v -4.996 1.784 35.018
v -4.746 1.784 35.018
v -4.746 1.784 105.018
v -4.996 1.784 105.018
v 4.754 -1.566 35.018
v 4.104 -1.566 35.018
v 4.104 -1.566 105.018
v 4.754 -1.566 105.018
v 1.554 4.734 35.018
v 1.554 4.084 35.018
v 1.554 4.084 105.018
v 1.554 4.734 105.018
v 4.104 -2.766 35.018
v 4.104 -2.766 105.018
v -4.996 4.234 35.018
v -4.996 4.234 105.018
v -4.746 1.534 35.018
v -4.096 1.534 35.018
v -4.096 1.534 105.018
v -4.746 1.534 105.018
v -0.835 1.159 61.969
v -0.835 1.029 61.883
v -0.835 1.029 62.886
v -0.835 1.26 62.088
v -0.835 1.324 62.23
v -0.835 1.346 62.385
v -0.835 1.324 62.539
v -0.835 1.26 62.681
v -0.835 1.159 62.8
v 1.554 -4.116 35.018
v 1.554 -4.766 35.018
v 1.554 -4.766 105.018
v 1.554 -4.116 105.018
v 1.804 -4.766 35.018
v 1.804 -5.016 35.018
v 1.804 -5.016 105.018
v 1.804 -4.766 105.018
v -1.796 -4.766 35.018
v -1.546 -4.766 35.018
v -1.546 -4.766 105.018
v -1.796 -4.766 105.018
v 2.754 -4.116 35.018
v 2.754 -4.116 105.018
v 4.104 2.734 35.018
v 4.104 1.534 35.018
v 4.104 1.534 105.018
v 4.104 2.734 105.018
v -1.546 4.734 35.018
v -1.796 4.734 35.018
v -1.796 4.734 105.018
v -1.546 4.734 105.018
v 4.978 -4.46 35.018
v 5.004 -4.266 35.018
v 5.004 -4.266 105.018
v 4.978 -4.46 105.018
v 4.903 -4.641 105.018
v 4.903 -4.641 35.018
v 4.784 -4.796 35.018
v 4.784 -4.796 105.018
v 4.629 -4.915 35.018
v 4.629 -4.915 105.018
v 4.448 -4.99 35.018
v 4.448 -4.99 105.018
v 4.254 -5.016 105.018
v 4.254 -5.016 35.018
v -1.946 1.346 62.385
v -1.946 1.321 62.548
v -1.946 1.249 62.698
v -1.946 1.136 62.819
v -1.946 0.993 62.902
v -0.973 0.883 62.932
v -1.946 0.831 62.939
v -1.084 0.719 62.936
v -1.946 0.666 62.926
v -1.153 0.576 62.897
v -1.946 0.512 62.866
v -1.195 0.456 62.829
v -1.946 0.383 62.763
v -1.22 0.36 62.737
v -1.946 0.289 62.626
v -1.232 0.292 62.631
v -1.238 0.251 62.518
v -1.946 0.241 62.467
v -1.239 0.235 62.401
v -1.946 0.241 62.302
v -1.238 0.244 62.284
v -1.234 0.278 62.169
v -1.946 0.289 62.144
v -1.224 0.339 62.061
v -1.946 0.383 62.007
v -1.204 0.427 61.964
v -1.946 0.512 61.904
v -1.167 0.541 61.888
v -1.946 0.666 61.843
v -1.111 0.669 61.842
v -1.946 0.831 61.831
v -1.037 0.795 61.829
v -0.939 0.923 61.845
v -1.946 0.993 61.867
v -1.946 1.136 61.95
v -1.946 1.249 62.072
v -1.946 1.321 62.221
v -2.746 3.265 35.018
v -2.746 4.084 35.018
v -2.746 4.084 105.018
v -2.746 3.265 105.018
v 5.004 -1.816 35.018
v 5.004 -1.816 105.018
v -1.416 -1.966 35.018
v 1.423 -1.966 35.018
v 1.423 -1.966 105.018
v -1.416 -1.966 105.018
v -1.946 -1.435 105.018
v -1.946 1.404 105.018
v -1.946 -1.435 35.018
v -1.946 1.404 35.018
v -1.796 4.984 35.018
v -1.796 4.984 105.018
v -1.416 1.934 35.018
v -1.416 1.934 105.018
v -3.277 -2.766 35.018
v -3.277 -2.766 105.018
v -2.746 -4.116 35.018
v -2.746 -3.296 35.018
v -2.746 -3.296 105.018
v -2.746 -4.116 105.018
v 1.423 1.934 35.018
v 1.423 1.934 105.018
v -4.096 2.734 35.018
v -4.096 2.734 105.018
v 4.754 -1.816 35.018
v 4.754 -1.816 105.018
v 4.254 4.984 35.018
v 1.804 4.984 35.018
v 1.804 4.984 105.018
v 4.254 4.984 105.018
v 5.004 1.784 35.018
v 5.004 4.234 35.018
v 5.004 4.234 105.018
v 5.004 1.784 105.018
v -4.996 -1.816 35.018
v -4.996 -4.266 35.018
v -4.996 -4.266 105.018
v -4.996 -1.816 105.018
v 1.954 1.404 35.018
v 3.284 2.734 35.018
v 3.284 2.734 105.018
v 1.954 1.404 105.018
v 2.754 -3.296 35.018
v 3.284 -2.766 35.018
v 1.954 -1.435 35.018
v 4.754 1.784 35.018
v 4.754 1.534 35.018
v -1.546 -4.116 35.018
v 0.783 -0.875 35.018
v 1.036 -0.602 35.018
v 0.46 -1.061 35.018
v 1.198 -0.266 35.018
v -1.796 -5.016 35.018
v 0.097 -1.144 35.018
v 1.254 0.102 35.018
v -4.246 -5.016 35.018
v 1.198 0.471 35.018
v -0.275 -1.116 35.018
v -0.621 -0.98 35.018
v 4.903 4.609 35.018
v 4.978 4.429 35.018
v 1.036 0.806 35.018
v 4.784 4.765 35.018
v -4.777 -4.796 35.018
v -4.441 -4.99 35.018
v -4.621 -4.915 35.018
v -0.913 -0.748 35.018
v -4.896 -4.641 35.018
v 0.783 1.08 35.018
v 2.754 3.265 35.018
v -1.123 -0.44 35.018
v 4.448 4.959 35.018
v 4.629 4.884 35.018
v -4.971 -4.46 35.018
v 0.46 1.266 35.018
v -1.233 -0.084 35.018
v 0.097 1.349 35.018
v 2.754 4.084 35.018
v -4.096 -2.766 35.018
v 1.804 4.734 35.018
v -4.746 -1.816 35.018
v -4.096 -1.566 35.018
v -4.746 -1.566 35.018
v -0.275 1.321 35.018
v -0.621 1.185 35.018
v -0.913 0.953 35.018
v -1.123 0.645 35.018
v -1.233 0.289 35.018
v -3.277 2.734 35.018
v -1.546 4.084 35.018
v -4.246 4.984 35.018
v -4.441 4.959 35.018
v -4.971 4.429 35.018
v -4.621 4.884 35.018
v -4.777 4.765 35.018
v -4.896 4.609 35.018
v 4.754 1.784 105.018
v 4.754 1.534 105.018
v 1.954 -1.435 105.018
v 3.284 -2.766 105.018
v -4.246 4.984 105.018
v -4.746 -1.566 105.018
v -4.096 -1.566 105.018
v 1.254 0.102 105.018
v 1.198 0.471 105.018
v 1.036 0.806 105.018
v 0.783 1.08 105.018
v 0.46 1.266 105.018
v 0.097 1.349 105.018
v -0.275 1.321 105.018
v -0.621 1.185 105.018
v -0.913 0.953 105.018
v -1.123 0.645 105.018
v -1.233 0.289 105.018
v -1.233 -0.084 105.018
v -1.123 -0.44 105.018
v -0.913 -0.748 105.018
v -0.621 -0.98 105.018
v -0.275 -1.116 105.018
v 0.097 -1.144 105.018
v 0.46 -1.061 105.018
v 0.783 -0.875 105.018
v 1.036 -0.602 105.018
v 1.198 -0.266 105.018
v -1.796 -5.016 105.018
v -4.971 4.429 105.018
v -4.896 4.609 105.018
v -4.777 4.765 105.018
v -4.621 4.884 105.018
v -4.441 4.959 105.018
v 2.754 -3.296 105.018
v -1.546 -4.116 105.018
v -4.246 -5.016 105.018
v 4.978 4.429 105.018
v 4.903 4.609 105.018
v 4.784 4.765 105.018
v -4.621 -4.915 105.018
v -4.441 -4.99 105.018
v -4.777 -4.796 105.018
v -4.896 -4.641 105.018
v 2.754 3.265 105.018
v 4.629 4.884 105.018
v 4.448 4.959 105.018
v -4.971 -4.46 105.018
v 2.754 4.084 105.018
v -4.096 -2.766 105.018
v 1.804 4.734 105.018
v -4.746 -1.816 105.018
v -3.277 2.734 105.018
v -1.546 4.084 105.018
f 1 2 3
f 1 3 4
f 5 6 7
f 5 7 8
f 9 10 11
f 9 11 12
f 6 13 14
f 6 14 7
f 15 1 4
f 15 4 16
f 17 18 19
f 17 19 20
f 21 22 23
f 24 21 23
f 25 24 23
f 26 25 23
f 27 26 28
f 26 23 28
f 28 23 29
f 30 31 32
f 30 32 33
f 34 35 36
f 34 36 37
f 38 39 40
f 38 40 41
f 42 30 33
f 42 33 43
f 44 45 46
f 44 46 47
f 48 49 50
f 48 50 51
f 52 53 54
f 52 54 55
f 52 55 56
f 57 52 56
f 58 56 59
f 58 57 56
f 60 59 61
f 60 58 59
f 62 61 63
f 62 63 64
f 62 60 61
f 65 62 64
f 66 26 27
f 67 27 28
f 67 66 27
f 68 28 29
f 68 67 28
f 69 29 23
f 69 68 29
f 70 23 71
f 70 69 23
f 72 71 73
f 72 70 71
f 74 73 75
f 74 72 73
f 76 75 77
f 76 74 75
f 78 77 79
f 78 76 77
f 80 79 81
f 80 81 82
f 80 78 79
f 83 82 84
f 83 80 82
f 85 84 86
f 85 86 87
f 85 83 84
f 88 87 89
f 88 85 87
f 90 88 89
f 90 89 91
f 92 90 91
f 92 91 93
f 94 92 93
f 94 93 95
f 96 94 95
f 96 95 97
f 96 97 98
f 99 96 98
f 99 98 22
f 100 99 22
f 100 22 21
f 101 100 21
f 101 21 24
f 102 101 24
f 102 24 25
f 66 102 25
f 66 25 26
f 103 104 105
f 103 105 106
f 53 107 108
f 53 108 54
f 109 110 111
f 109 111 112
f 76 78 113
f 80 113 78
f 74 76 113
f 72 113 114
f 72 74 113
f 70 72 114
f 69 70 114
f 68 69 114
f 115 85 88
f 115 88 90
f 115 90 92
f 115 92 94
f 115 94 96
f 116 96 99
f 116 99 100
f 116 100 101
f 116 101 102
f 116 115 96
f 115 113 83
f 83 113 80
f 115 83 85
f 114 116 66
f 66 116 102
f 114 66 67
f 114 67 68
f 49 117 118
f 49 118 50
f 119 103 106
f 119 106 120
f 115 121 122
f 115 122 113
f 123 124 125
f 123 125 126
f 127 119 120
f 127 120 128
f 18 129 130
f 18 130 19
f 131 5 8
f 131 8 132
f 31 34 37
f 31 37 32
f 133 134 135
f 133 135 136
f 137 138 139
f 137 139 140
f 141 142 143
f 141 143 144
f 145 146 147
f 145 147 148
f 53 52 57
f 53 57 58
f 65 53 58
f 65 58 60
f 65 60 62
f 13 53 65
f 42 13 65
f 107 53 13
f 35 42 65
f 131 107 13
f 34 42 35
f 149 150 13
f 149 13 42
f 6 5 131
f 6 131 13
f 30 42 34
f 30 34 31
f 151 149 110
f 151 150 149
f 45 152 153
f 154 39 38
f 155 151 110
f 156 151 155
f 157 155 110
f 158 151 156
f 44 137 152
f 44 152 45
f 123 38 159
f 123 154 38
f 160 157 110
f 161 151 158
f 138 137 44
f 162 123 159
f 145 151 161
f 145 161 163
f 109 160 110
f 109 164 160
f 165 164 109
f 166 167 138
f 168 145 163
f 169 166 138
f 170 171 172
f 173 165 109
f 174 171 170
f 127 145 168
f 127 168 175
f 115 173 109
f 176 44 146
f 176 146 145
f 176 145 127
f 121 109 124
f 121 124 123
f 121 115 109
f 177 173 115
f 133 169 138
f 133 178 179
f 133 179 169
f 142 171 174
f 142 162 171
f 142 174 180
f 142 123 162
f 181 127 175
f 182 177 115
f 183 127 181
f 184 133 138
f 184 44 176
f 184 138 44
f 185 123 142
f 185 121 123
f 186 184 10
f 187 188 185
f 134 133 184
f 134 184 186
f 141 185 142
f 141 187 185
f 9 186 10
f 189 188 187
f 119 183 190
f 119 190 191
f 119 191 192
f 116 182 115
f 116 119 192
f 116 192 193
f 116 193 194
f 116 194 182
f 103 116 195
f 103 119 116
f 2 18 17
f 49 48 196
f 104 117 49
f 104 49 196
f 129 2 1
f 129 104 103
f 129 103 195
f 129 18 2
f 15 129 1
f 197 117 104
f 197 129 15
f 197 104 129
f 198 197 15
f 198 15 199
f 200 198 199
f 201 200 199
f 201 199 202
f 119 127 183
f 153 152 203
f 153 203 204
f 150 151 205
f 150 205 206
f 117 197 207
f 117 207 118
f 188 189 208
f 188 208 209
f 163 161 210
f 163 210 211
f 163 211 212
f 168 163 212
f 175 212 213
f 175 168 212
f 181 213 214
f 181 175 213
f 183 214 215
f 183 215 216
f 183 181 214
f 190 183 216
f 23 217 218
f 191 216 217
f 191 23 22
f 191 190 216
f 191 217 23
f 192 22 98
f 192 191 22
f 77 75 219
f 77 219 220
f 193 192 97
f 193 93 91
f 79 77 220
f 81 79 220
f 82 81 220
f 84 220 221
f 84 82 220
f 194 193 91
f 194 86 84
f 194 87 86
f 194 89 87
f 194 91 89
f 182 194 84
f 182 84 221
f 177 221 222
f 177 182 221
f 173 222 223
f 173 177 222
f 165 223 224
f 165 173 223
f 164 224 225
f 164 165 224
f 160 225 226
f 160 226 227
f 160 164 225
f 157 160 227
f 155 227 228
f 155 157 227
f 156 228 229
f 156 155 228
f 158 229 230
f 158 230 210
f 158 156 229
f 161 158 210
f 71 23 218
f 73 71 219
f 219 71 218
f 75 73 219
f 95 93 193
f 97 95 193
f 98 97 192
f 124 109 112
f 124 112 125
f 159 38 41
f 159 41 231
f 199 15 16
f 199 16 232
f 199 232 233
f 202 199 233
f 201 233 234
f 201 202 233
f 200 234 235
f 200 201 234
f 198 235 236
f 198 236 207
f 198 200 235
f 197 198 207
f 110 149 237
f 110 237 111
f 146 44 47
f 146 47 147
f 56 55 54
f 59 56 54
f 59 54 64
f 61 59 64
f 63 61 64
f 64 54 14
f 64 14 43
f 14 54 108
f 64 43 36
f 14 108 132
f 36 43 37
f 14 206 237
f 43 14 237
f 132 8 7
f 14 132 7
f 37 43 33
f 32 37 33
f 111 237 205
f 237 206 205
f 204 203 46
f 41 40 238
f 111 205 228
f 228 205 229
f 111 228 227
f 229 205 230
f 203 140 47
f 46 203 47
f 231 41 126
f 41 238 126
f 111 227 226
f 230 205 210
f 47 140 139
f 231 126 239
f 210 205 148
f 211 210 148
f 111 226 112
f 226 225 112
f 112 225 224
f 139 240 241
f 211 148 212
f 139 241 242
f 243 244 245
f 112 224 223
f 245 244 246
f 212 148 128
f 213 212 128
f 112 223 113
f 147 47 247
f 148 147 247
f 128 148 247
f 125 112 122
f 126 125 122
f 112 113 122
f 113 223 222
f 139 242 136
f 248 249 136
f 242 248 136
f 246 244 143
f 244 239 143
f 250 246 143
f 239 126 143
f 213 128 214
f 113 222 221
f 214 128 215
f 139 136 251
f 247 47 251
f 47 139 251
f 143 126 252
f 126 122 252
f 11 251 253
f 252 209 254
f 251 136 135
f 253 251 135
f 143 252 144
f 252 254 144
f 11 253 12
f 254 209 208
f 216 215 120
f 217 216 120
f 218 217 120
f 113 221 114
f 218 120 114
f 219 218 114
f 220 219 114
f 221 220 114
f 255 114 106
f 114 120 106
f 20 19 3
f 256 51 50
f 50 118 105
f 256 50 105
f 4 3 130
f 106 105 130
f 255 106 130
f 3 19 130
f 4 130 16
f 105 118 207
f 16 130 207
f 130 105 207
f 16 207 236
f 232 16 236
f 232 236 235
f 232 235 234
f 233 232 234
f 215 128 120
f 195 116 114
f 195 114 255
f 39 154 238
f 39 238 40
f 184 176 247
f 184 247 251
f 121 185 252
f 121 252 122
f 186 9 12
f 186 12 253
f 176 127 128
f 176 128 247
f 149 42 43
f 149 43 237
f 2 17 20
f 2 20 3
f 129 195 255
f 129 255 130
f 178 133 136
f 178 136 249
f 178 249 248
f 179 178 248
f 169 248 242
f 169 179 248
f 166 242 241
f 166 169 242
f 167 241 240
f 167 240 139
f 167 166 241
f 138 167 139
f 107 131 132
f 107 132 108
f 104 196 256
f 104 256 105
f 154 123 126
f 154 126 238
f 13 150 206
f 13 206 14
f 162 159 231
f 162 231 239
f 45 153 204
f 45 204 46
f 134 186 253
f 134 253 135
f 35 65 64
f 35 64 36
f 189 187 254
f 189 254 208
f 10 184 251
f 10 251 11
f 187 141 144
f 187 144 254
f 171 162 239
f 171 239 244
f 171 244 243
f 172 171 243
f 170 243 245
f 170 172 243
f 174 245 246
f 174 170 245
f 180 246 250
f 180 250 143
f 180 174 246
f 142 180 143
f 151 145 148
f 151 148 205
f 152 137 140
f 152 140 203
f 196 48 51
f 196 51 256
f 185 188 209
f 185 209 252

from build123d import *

# Parameters (mm, degrees)
SKETCH1_R           = 2.5
BOSS_EXTRUDE1_DEPTH = 140
SCALE_2_SCALE       = 3
SCALE_3_SCALE       = 6
SCALE_5_SCALE       = 2
SCALE_6_SCALE       = 0.25
SCALE_7_SCALE       = 0.125
SCALE_8_SCALE       = 0.25
SCALE_9_SCALE       = 4
SCALE_10_SCALE      = 4
OTHER_START         = -17.55
OTHER_1_OUTLINE_R   = 5
OTHER_1_DEPTH       = 10
SCALE_11_SCALE      = 0.111111111


# Read off the part's stored shape, not the designer's step: 孔1
with BuildPart() as part:
    # Sketch1 → Boss-Extrude1 (new body)
    with BuildSketch(Plane.XY):
        with BuildLine():
            Line((2.839339828, 3.9), (5.5, 6.560660172))
            Line((5.5, 6.560660172), (5.5, 8.2))
            Line((5.5, 8.2), (3.1, 8.2))
            Line((3.1, 8.2), (3.1, 9.5))
            Line((3.1, 9.5), (3.6, 9.5))
            Line((3.6, 9.5), (3.6, 10))
            Line((3.6, 10), (8.5, 10))
            ThreePointArc((8.5, 10), (9.560660172, 9.560660172), (10, 8.5))
            Line((10, 8.5), (10, 3.6))
            Line((10, 3.6), (9.5, 3.6))
            Line((9.5, 3.6), (9.5, 3.1))
            Line((9.5, 3.1), (8.2, 3.1))
            Line((8.2, 3.1), (8.2, 5.5))
            Line((8.2, 5.5), (6.560660172, 5.5))
            Line((6.560660172, 5.5), (3.9, 2.839339828))
            Line((3.9, 2.839339828), (3.9, -2.839339828))
            Line((3.9, -2.839339828), (6.560660172, -5.5))
            Line((6.560660172, -5.5), (8.2, -5.5))
            Line((8.2, -5.5), (8.2, -3.1))
            Line((8.2, -3.1), (9.5, -3.1))
            Line((9.5, -3.1), (9.5, -3.6))
            Line((9.5, -3.6), (10, -3.6))
            Line((10, -3.6), (10, -8.5))
            ThreePointArc((10, -8.5), (9.560660172, -9.560660172), (8.5, -10))
            Line((8.5, -10), (3.6, -10))
            Line((3.6, -10), (3.6, -9.5))
            Line((3.6, -9.5), (3.1, -9.5))
            Line((3.1, -9.5), (3.1, -8.2))
            Line((3.1, -8.2), (5.5, -8.2))
            Line((5.5, -8.2), (5.5, -6.560660172))
            Line((5.5, -6.560660172), (2.839339828, -3.9))
            Line((2.839339828, -3.9), (-2.839339828, -3.9))
            Line((-2.839339828, -3.9), (-5.5, -6.560660172))
            Line((-5.5, -6.560660172), (-5.5, -8.2))
            Line((-5.5, -8.2), (-3.1, -8.2))
            Line((-3.1, -8.2), (-3.1, -9.5))
            Line((-3.1, -9.5), (-3.6, -9.5))
            Line((-3.6, -9.5), (-3.6, -10))
            Line((-3.6, -10), (-8.5, -10))
            ThreePointArc((-8.5, -10), (-9.560660172, -9.560660172), (-10, -8.5))
            Line((-10, -8.5), (-10, -3.6))
            Line((-10, -3.6), (-9.5, -3.6))
            Line((-9.5, -3.6), (-9.5, -3.1))
            Line((-9.5, -3.1), (-8.2, -3.1))
            Line((-8.2, -3.1), (-8.2, -5.5))
            Line((-8.2, -5.5), (-6.560660172, -5.5))
            Line((-6.560660172, -5.5), (-3.9, -2.839339828))
            Line((-3.9, -2.839339828), (-3.9, 2.839339828))
            Line((-3.9, 2.839339828), (-6.560660172, 5.5))
            Line((-6.560660172, 5.5), (-8.2, 5.5))
            Line((-8.2, 5.5), (-8.2, 3.1))
            Line((-8.2, 3.1), (-9.5, 3.1))
            Line((-9.5, 3.1), (-9.5, 3.6))
            Line((-9.5, 3.6), (-10, 3.6))
            Line((-10, 3.6), (-10, 8.5))
            ThreePointArc((-10, 8.5), (-9.560660172, 9.560660172), (-8.5, 10))
            Line((-8.5, 10), (-3.6, 10))
            Line((-3.6, 10), (-3.6, 9.5))
            Line((-3.6, 9.5), (-3.1, 9.5))
            Line((-3.1, 9.5), (-3.1, 8.2))
            Line((-3.1, 8.2), (-5.5, 8.2))
            Line((-5.5, 8.2), (-5.5, 6.560660172))
            Line((-5.5, 6.560660172), (-2.839339828, 3.9))
            Line((-2.839339828, 3.9), (2.839339828, 3.9))
        make_face()
        with Locations((0, 0.235847297)):
            Circle(SKETCH1_R, mode=Mode.SUBTRACT)
    extrude(amount=BOSS_EXTRUDE1_DEPTH)


with BuildPart() as part_1:
    # 缩放比例2: scaled about (0, -0.027095247, 70)
    add(part.part.scale(SCALE_2_SCALE).moved(Location((0, 0.054190494, -140))))


with BuildPart() as part_2:
    # 缩放比例3: scaled about (0, -0.027095247, 70)
    add(part_1.part.scale(SCALE_3_SCALE).moved(Location((0, 0.135476235, -350))))


with BuildPart() as part_3:
    # 缩放比例5: scaled about (0, -0.027095249, 70)
    add(part_2.part.scale(SCALE_5_SCALE).moved(Location((0, 0.027095249, -70))))


with BuildPart() as part_4:
    # 缩放比例6: scaled about (0, -0.027095249, 70)
    add(part_3.part.scale(SCALE_6_SCALE).moved(Location((0, -0.020321437, 52.5))))


with BuildPart() as part_5:
    # 缩放比例7: scaled about (0, -0.027095249, 70)
    add(part_4.part.scale(SCALE_7_SCALE).moved(Location((0, -0.023708343, 61.25))))


with BuildPart() as part_6:
    # 缩放比例8: scaled about (0, -0.027095249, 70)
    add(part_5.part.scale(SCALE_8_SCALE).moved(Location((0, -0.020321437, 52.5))))


with BuildPart() as part_7:
    # 缩放比例9: scaled about (0, -0.027095249, 70)
    add(part_6.part.scale(SCALE_9_SCALE).moved(Location((0, 0.081285747, -210))))


with BuildPart() as part_8:
    # 缩放比例10: scaled about (0, -0.027095249, 70)
    add(part_7.part.scale(SCALE_10_SCALE).moved(Location((0, 0.081285747, -210))))

    # 孔1 outline → 孔1 (cut)
    with BuildSketch(Plane.YZ.offset(OTHER_START)):
        with Locations((7.344833538, 1.297306883)):
            Circle(OTHER_1_OUTLINE_R)
    extrude(amount=OTHER_1_DEPTH, mode=Mode.SUBTRACT)


with BuildPart() as part_9:
    # 缩放比例11: scaled about (0.003980467, -0.029415588, 70.020567574)
    add(part_8.part.scale(SCALE_11_SCALE).moved(Location((0.003538193, -0.026147189, 62.24050451))))


solid = part_9.part
